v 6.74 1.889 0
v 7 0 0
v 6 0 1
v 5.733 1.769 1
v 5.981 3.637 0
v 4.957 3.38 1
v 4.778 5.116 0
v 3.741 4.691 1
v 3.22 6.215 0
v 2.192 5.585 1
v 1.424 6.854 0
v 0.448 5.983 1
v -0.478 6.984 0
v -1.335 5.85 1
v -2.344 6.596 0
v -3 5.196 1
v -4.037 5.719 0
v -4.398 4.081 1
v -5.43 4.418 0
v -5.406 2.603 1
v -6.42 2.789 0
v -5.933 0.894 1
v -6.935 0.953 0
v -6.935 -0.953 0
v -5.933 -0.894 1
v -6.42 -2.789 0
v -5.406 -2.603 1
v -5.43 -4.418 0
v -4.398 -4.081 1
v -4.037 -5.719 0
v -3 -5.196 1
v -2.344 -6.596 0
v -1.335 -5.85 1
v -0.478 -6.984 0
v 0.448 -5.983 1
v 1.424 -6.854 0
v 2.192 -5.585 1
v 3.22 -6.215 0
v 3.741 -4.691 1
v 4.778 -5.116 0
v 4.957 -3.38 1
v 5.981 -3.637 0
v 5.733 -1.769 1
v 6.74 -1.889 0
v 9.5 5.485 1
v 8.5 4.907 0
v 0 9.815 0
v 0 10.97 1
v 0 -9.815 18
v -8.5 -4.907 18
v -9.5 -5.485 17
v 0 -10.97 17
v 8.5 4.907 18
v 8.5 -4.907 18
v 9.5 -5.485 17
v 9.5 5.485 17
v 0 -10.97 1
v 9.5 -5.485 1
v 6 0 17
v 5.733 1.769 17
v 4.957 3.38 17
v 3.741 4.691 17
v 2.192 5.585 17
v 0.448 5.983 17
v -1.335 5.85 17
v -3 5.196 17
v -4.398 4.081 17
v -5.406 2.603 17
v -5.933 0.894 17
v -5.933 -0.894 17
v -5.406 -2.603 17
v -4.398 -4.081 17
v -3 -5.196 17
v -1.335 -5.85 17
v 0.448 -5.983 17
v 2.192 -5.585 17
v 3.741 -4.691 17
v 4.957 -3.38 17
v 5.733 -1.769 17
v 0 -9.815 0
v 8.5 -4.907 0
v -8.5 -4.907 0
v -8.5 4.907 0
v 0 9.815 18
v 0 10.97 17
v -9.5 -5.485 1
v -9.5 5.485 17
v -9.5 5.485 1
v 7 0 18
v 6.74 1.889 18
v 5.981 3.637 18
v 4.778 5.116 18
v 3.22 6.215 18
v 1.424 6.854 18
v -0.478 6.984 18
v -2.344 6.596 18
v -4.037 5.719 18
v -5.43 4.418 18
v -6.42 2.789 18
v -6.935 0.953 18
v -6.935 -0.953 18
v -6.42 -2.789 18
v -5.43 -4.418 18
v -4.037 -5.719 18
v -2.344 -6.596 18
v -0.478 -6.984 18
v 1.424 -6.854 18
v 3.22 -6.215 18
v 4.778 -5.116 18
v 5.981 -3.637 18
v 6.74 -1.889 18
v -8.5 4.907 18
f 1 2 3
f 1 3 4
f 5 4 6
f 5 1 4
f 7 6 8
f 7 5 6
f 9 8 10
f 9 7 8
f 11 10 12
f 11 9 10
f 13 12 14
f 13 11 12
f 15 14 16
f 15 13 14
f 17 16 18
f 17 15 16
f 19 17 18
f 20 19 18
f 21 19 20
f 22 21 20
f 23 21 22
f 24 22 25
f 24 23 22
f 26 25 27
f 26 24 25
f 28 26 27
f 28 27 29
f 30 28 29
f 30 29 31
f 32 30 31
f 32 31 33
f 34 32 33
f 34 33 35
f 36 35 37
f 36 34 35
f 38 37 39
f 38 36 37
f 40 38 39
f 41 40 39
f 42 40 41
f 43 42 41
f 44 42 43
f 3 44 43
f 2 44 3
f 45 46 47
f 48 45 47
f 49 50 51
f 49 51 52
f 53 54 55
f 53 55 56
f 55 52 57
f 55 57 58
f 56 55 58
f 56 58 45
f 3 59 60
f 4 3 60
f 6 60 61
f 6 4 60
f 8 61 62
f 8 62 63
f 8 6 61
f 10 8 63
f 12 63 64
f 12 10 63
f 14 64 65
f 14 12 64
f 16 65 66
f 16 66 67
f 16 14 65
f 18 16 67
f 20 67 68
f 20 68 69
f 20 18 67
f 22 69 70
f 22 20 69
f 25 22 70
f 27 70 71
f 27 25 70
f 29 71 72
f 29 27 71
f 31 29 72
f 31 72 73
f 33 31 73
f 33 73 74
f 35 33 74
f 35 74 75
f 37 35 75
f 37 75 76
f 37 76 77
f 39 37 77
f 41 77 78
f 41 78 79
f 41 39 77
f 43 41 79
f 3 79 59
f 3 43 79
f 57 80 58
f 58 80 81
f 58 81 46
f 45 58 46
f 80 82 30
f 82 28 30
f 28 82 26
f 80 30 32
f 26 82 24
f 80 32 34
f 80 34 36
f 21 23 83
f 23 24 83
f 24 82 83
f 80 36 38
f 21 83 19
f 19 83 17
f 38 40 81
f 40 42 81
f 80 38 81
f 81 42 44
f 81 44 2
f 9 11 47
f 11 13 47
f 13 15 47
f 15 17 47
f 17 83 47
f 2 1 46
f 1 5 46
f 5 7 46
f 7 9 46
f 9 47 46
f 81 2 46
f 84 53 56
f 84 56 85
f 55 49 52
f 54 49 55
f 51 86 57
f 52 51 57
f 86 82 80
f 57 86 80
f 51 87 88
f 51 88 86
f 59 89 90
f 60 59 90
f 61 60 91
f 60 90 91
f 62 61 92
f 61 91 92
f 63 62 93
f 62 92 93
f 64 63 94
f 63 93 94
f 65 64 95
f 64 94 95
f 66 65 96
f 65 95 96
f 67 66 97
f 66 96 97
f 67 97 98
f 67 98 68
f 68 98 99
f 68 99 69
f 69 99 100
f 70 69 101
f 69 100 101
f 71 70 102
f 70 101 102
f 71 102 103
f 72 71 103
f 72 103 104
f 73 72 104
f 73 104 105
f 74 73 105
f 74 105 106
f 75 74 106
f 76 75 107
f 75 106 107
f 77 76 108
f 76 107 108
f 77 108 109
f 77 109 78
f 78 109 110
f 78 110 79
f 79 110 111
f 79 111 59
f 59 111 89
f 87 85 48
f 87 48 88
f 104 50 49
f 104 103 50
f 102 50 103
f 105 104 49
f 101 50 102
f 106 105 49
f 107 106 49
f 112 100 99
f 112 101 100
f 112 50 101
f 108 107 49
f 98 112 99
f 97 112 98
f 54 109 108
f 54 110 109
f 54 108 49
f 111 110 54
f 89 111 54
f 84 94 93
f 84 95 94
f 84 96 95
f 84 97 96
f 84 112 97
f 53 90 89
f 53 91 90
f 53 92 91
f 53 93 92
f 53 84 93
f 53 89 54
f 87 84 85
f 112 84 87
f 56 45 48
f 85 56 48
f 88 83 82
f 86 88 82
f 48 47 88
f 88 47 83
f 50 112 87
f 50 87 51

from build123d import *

# Parameters (mm, degrees)
ESQUISSE1_R        = 6
BOSS_EXTRU_1_DEPTH = 18
CHANFREIN1_SIZE    = 1


with BuildPart() as part:
    # Esquisse1 → Boss.-Extru.1 (new body)
    with BuildSketch(Plane.XY):
        Polygon((9.5, -5.484827557), (9.5, 5.484827557), (0, 10.969655115), (-9.5, 5.484827557), (-9.5, -5.484827557), (0, -10.969655115), align=None)
        Circle(ESQUISSE1_R, mode=Mode.SUBTRACT)
    extrude(amount=BOSS_EXTRU_1_DEPTH)

    # Chanfrein1
    chanfrein1_edges = [part.edges().sort_by_distance(p)[0] for p in [
        (-4.75, -8.227241336, 18),
        (4.75, -8.227241336, 18),
        (9.5, 0, 18),
        (-6, 0, 0),
        (-6, 0, 18),
        (4.75, 8.227241336, 18),
        (-4.75, 8.227241336, 18),
        (4.75, 8.227241336, 0),
        (9.5, 0, 0),
        (4.75, -8.227241336, 0),
        (-9.5, 0, 18),
        (-4.75, -8.227241336, 0),
        (-9.5, 0, 0),
        (-4.75, 8.227241336, 0),
    ]]
    chamfer(chanfrein1_edges, length=CHANFREIN1_SIZE)


solid = part.part
